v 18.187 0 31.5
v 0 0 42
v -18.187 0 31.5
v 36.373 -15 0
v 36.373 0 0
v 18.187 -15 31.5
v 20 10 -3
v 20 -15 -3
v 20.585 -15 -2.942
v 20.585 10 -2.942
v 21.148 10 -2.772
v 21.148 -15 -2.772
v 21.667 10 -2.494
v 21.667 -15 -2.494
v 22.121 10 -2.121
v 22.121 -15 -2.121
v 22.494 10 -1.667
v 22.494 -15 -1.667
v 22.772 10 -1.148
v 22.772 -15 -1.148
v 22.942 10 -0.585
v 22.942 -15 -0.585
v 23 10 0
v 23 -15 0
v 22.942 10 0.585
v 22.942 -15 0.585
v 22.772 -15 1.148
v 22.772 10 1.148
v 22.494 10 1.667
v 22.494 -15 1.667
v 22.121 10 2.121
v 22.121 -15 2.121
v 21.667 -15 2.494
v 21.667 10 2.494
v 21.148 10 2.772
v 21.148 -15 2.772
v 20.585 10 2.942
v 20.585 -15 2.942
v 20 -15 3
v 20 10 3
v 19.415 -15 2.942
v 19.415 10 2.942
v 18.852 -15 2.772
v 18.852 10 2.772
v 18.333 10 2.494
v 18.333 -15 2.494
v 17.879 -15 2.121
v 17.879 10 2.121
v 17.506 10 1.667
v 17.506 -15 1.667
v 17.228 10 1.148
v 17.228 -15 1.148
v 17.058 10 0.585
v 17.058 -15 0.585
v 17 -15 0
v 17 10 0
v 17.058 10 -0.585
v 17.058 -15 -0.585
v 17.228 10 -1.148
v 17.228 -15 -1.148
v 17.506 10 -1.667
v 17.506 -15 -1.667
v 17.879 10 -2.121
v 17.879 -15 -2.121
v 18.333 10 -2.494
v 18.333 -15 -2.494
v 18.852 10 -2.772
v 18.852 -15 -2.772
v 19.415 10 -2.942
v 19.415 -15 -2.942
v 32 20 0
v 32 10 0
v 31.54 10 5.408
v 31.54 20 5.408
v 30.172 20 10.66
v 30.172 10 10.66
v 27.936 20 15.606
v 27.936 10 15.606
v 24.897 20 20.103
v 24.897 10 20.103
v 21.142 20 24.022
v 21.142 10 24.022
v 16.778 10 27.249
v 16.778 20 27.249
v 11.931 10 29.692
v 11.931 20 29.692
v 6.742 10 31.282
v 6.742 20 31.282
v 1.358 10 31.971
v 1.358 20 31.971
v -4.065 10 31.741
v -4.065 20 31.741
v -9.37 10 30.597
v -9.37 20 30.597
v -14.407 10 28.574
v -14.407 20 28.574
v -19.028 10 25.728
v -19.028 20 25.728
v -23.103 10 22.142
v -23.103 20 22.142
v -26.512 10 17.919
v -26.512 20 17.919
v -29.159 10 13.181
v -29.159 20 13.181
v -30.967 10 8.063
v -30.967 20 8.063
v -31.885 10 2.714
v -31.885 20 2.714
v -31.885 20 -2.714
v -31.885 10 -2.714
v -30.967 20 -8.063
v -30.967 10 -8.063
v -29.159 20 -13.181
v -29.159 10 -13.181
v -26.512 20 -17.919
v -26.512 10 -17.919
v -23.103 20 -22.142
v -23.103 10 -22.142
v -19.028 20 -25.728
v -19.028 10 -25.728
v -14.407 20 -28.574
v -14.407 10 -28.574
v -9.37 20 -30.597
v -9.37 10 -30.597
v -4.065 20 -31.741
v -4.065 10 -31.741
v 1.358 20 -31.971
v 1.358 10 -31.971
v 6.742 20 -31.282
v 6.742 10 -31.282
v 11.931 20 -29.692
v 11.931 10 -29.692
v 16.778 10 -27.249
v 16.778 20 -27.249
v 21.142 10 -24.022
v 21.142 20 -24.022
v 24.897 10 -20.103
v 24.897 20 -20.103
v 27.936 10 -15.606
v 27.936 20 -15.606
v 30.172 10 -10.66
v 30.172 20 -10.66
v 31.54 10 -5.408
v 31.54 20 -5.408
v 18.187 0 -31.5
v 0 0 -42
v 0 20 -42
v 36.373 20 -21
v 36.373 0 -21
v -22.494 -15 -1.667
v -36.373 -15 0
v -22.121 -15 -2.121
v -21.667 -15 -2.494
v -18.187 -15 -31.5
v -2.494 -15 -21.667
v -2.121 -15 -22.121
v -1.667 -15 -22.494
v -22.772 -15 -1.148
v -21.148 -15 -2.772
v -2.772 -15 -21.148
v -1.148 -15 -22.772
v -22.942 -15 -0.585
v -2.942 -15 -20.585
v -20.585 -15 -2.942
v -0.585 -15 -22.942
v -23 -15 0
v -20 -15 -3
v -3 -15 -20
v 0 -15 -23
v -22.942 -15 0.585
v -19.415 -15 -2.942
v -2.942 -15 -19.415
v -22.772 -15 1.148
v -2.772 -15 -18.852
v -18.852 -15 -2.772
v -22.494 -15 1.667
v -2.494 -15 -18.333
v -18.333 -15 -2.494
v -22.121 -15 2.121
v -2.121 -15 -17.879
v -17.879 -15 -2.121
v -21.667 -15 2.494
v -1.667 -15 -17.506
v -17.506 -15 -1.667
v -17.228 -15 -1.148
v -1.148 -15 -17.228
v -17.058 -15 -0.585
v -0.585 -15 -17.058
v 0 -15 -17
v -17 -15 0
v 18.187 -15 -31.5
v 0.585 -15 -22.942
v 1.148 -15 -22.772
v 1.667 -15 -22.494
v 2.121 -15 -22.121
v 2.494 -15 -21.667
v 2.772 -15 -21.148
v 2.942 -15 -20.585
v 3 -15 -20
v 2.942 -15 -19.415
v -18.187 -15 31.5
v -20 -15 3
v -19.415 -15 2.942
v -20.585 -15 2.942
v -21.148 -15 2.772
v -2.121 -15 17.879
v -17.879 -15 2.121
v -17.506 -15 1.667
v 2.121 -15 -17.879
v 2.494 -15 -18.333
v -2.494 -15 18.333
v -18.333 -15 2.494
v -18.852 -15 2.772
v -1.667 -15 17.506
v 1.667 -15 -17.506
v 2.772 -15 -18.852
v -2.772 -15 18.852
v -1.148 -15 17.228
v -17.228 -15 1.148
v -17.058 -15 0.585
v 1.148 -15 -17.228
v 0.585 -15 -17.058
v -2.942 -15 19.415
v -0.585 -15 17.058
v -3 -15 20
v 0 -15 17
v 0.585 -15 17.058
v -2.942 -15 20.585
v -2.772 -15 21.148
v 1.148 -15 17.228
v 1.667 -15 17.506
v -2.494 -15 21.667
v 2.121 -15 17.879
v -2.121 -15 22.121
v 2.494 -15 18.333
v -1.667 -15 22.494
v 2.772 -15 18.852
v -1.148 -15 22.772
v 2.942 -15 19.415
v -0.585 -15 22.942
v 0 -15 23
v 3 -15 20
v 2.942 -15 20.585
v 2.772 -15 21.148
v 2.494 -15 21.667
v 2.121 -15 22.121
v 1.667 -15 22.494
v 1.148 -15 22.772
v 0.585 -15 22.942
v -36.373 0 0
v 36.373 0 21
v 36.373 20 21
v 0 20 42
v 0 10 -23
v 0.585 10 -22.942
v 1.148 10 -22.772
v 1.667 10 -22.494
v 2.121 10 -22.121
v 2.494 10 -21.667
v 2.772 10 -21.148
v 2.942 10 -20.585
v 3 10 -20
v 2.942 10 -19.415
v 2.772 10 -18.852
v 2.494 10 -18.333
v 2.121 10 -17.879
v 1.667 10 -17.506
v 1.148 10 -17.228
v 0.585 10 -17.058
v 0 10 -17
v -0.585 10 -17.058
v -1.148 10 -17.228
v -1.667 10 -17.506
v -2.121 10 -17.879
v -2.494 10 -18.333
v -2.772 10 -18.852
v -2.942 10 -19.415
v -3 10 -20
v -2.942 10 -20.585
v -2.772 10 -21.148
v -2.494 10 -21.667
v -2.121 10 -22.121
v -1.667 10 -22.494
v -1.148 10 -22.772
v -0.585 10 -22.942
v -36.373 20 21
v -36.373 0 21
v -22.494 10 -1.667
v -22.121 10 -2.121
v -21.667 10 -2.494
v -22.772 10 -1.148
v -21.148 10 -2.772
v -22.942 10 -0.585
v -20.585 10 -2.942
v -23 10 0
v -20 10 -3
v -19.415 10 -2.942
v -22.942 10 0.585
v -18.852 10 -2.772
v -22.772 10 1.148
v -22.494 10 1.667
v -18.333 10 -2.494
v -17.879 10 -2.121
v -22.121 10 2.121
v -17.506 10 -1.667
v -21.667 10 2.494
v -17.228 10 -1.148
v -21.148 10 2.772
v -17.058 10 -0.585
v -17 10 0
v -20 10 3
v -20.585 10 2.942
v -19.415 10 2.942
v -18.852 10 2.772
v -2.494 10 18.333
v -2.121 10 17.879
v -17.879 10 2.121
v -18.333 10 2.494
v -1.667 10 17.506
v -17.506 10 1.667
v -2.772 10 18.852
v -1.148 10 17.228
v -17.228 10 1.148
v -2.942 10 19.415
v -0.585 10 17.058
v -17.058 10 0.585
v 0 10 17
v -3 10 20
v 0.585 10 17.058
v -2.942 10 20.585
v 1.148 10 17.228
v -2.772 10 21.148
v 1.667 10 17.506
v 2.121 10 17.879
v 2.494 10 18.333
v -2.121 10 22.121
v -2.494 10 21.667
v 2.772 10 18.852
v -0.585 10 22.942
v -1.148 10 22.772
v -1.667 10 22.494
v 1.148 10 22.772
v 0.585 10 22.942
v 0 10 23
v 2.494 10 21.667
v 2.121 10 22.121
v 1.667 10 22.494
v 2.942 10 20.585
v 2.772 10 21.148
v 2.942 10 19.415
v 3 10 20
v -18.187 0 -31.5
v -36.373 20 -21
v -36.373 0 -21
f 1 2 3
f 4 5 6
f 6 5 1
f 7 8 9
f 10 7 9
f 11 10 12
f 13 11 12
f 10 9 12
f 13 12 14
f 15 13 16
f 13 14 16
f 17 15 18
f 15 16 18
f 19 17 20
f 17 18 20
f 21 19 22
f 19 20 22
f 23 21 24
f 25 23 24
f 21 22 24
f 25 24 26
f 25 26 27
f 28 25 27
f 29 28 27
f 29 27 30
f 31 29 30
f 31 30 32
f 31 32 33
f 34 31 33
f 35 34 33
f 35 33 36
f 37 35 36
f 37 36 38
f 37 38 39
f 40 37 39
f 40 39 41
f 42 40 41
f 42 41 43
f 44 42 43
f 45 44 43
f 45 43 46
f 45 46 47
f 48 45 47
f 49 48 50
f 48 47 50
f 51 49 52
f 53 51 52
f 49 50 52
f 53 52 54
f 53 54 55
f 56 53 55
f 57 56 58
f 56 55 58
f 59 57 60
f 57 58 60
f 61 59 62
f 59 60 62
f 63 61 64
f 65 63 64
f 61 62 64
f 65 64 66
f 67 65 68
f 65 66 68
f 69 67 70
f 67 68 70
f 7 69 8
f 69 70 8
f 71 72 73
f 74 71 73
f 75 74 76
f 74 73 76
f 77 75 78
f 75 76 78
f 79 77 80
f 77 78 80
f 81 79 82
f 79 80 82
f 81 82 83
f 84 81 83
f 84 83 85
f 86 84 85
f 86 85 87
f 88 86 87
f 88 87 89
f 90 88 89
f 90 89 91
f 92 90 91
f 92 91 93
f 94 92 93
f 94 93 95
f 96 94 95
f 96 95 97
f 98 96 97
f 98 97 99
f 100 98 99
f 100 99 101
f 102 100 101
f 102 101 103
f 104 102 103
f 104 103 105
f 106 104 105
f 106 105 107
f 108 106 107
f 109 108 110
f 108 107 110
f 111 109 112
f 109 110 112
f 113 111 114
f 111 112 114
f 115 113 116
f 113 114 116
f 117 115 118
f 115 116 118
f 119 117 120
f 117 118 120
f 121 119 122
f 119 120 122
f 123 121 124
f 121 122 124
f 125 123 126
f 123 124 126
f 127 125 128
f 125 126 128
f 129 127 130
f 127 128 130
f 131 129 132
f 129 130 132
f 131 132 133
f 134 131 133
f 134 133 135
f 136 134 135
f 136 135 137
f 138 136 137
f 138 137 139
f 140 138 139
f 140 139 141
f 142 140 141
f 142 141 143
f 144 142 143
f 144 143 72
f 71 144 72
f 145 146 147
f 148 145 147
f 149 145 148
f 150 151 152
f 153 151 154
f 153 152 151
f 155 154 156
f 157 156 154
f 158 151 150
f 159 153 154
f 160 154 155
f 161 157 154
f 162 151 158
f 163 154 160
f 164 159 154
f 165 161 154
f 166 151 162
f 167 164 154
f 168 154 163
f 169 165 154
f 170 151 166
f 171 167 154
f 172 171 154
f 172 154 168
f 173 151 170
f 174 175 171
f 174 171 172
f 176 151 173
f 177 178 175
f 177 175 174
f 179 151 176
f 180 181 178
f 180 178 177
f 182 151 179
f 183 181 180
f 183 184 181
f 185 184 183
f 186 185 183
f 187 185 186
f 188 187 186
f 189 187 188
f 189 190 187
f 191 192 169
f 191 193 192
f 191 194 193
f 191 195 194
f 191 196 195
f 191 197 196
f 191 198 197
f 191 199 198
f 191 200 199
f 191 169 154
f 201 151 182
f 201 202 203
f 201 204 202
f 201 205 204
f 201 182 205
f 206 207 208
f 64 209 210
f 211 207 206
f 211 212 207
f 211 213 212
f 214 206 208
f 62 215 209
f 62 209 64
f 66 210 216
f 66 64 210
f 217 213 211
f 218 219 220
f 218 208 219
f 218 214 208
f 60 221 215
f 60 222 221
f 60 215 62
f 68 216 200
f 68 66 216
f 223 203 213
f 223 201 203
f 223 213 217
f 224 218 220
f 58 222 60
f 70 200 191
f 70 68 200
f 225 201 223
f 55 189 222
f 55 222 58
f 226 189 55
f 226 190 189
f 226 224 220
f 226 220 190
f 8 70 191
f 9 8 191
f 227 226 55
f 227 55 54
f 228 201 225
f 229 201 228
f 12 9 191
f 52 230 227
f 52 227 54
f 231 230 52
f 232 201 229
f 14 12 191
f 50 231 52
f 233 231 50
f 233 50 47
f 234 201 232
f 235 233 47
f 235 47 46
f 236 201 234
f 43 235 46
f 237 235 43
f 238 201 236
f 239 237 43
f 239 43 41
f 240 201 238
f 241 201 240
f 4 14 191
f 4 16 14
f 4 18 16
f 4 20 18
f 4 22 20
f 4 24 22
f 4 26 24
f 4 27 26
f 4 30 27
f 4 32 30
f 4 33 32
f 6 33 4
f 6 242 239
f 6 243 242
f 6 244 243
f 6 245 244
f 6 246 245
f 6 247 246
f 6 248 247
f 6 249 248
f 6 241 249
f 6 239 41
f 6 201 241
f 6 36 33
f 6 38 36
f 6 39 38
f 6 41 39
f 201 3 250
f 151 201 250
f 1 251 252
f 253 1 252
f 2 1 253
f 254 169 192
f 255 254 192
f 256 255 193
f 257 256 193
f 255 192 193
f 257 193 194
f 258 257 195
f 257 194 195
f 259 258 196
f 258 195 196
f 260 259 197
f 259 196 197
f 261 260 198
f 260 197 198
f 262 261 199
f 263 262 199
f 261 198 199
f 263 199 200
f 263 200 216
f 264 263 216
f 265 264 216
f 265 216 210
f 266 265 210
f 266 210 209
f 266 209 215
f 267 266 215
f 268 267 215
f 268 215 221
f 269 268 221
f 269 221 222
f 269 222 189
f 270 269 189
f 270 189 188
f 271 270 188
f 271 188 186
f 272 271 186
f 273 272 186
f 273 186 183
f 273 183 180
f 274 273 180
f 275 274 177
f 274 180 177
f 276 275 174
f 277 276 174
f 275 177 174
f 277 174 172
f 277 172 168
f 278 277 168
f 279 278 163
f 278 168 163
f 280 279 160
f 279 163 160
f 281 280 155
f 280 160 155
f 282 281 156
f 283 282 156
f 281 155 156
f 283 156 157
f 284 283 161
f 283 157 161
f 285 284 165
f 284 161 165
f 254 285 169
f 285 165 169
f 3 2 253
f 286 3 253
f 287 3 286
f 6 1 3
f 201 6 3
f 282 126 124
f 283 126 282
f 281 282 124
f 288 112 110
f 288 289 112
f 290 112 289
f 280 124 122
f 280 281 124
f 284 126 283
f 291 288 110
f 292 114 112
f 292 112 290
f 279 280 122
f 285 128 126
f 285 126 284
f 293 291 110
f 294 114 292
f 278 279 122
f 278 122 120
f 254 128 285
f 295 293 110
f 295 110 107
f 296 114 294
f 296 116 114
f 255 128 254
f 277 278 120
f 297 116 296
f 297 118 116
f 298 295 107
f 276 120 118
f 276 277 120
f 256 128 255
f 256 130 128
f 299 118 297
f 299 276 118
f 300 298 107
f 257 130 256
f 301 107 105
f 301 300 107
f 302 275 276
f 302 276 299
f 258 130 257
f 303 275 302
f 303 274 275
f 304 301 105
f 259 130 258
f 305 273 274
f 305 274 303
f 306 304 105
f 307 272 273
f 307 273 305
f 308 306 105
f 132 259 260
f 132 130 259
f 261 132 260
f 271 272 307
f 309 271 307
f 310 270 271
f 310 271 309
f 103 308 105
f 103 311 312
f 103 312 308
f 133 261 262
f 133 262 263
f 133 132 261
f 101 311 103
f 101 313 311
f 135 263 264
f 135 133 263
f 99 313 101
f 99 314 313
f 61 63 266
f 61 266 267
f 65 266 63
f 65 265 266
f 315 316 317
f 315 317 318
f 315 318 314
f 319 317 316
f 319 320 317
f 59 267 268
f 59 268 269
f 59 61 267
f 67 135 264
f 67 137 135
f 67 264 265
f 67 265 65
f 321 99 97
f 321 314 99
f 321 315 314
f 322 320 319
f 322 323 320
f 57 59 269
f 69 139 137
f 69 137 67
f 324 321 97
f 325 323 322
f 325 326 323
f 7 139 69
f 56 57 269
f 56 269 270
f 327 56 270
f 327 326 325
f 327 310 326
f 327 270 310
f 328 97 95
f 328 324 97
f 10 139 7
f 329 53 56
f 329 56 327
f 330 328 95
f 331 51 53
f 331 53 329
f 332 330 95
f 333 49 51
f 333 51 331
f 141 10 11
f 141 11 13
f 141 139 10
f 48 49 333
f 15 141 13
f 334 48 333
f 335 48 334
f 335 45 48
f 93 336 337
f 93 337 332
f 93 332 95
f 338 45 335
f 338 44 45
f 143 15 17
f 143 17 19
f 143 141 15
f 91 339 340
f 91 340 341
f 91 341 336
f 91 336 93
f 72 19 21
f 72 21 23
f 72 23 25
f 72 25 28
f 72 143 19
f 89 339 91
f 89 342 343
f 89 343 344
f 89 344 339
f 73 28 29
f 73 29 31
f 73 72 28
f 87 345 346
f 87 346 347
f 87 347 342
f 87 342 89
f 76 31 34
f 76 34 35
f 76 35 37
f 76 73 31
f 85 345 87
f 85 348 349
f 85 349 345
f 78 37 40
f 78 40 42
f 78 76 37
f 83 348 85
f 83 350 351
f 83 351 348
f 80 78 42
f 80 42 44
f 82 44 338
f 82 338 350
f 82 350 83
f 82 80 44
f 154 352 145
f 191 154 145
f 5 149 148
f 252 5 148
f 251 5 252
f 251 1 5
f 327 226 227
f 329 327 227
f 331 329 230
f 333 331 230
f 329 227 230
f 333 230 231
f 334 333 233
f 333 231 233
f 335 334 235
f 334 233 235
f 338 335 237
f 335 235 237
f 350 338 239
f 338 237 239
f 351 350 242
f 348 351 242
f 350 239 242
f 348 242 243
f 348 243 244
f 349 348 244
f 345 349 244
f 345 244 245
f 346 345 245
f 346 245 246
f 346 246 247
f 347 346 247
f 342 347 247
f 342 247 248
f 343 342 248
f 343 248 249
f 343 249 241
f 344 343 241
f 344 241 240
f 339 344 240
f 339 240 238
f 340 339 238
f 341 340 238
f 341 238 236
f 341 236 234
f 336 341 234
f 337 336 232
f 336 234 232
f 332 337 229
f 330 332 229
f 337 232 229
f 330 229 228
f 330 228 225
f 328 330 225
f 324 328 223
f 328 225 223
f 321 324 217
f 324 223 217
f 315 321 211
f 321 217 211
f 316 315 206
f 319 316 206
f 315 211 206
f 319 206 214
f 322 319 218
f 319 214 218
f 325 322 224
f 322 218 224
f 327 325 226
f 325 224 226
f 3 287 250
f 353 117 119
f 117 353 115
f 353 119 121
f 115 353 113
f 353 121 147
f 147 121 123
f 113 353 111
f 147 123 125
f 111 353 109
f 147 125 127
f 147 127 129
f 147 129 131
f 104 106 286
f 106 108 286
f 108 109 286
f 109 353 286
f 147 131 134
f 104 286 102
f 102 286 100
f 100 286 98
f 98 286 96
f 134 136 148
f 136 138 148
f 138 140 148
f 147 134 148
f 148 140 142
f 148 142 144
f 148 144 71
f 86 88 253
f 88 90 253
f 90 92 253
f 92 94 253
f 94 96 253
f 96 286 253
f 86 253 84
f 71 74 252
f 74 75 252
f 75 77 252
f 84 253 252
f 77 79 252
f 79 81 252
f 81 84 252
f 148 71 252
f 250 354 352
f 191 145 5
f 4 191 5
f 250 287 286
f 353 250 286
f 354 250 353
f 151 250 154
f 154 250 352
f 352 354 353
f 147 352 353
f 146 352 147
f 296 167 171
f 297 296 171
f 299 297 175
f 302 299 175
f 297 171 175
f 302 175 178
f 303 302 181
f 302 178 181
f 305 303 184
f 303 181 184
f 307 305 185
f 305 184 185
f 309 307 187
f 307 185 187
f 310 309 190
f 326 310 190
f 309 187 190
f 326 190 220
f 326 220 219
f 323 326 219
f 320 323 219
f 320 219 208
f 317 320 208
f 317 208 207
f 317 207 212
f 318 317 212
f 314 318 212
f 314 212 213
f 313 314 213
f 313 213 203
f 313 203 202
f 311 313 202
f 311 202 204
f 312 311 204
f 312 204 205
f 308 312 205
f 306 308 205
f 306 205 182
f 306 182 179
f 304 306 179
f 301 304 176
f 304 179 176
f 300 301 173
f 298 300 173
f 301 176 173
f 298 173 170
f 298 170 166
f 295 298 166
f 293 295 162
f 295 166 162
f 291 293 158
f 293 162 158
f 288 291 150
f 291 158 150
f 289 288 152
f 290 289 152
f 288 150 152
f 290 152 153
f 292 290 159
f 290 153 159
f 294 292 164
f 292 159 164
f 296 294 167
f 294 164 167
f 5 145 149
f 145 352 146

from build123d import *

# Parameters (mm, degrees)
SKETCH2_R           = 32
BOSS_EXTRUDE1_DEPTH = 10
SKETCH3_R           = 42
SKETCH3_R_2         = 32
EXTRUDE_THIN1_DEPTH = 20
SKETCH4_OUTSIDE_W   = 110.094
SKETCH4_OUTSIDE_H   = 110.094
CUT_EXTRUDE1_DEPTH  = 63.673758464
BOSS_EXTRUDE2_DEPTH = 15
SKETCH6_R           = 3
CUT_EXTRUDE2_DEPTH  = 66.665820638


with BuildPart() as part:
    # Sketch2 → Boss-Extrude1 (new body)
    with BuildSketch(Plane(origin=(0, 0, 0), x_dir=(1, 0, 0), z_dir=(0, 1, 0))):
        with Locations(Location((0, 0, 0), (0, 0, 270))):
            Circle(SKETCH2_R)
    extrude(amount=BOSS_EXTRUDE1_DEPTH)

    # Sketch3 → Extrude-Thin1 (add)
    with BuildSketch(Plane.XZ):
        Circle(SKETCH3_R)
        Circle(SKETCH3_R_2, mode=Mode.SUBTRACT)
    extrude(amount=-EXTRUDE_THIN1_DEPTH)

    # Sketch4 outside → Cut-Extrude1 (cut, through all)
    with BuildSketch(Plane.XZ):
        Rectangle(SKETCH4_OUTSIDE_W, SKETCH4_OUTSIDE_H)
        Polygon((36.373066959, -21), (36.373066959, 21), (0, 42), (-36.373066959, 21), (-36.373066959, -21), (0, -42), align=None, mode=Mode.SUBTRACT)
    extrude(amount=-CUT_EXTRUDE1_DEPTH, mode=Mode.SUBTRACT)

    # Sketch5 → Boss-Extrude2 (add)
    with BuildSketch(Plane.XZ):
        Polygon((36.373066959, 0), (18.186533479, 31.5), (-18.186533479, 31.5), (-36.373066959, 0), (-18.186533479, -31.5), (18.186533479, -31.5), align=None)
    extrude(amount=BOSS_EXTRUDE2_DEPTH)

    # Sketch6 → Cut-Extrude2 (cut, through all)
    with BuildSketch(Plane.XZ.offset(15)):
        with Locations(Location((0, 20, 0), (0, 0, 270))):
            Circle(SKETCH6_R)
        with Locations(Location((20, 0, 0), (0, 0, 270))):
            Circle(SKETCH6_R)
        with Locations(Location((0, -20, 0), (0, 0, 270))):
            Circle(SKETCH6_R)
        with Locations(Location((-20, 0, 0), (0, 0, 270))):
            Circle(SKETCH6_R)
    extrude(amount=-CUT_EXTRUDE2_DEPTH, mode=Mode.SUBTRACT)


solid = part.part
